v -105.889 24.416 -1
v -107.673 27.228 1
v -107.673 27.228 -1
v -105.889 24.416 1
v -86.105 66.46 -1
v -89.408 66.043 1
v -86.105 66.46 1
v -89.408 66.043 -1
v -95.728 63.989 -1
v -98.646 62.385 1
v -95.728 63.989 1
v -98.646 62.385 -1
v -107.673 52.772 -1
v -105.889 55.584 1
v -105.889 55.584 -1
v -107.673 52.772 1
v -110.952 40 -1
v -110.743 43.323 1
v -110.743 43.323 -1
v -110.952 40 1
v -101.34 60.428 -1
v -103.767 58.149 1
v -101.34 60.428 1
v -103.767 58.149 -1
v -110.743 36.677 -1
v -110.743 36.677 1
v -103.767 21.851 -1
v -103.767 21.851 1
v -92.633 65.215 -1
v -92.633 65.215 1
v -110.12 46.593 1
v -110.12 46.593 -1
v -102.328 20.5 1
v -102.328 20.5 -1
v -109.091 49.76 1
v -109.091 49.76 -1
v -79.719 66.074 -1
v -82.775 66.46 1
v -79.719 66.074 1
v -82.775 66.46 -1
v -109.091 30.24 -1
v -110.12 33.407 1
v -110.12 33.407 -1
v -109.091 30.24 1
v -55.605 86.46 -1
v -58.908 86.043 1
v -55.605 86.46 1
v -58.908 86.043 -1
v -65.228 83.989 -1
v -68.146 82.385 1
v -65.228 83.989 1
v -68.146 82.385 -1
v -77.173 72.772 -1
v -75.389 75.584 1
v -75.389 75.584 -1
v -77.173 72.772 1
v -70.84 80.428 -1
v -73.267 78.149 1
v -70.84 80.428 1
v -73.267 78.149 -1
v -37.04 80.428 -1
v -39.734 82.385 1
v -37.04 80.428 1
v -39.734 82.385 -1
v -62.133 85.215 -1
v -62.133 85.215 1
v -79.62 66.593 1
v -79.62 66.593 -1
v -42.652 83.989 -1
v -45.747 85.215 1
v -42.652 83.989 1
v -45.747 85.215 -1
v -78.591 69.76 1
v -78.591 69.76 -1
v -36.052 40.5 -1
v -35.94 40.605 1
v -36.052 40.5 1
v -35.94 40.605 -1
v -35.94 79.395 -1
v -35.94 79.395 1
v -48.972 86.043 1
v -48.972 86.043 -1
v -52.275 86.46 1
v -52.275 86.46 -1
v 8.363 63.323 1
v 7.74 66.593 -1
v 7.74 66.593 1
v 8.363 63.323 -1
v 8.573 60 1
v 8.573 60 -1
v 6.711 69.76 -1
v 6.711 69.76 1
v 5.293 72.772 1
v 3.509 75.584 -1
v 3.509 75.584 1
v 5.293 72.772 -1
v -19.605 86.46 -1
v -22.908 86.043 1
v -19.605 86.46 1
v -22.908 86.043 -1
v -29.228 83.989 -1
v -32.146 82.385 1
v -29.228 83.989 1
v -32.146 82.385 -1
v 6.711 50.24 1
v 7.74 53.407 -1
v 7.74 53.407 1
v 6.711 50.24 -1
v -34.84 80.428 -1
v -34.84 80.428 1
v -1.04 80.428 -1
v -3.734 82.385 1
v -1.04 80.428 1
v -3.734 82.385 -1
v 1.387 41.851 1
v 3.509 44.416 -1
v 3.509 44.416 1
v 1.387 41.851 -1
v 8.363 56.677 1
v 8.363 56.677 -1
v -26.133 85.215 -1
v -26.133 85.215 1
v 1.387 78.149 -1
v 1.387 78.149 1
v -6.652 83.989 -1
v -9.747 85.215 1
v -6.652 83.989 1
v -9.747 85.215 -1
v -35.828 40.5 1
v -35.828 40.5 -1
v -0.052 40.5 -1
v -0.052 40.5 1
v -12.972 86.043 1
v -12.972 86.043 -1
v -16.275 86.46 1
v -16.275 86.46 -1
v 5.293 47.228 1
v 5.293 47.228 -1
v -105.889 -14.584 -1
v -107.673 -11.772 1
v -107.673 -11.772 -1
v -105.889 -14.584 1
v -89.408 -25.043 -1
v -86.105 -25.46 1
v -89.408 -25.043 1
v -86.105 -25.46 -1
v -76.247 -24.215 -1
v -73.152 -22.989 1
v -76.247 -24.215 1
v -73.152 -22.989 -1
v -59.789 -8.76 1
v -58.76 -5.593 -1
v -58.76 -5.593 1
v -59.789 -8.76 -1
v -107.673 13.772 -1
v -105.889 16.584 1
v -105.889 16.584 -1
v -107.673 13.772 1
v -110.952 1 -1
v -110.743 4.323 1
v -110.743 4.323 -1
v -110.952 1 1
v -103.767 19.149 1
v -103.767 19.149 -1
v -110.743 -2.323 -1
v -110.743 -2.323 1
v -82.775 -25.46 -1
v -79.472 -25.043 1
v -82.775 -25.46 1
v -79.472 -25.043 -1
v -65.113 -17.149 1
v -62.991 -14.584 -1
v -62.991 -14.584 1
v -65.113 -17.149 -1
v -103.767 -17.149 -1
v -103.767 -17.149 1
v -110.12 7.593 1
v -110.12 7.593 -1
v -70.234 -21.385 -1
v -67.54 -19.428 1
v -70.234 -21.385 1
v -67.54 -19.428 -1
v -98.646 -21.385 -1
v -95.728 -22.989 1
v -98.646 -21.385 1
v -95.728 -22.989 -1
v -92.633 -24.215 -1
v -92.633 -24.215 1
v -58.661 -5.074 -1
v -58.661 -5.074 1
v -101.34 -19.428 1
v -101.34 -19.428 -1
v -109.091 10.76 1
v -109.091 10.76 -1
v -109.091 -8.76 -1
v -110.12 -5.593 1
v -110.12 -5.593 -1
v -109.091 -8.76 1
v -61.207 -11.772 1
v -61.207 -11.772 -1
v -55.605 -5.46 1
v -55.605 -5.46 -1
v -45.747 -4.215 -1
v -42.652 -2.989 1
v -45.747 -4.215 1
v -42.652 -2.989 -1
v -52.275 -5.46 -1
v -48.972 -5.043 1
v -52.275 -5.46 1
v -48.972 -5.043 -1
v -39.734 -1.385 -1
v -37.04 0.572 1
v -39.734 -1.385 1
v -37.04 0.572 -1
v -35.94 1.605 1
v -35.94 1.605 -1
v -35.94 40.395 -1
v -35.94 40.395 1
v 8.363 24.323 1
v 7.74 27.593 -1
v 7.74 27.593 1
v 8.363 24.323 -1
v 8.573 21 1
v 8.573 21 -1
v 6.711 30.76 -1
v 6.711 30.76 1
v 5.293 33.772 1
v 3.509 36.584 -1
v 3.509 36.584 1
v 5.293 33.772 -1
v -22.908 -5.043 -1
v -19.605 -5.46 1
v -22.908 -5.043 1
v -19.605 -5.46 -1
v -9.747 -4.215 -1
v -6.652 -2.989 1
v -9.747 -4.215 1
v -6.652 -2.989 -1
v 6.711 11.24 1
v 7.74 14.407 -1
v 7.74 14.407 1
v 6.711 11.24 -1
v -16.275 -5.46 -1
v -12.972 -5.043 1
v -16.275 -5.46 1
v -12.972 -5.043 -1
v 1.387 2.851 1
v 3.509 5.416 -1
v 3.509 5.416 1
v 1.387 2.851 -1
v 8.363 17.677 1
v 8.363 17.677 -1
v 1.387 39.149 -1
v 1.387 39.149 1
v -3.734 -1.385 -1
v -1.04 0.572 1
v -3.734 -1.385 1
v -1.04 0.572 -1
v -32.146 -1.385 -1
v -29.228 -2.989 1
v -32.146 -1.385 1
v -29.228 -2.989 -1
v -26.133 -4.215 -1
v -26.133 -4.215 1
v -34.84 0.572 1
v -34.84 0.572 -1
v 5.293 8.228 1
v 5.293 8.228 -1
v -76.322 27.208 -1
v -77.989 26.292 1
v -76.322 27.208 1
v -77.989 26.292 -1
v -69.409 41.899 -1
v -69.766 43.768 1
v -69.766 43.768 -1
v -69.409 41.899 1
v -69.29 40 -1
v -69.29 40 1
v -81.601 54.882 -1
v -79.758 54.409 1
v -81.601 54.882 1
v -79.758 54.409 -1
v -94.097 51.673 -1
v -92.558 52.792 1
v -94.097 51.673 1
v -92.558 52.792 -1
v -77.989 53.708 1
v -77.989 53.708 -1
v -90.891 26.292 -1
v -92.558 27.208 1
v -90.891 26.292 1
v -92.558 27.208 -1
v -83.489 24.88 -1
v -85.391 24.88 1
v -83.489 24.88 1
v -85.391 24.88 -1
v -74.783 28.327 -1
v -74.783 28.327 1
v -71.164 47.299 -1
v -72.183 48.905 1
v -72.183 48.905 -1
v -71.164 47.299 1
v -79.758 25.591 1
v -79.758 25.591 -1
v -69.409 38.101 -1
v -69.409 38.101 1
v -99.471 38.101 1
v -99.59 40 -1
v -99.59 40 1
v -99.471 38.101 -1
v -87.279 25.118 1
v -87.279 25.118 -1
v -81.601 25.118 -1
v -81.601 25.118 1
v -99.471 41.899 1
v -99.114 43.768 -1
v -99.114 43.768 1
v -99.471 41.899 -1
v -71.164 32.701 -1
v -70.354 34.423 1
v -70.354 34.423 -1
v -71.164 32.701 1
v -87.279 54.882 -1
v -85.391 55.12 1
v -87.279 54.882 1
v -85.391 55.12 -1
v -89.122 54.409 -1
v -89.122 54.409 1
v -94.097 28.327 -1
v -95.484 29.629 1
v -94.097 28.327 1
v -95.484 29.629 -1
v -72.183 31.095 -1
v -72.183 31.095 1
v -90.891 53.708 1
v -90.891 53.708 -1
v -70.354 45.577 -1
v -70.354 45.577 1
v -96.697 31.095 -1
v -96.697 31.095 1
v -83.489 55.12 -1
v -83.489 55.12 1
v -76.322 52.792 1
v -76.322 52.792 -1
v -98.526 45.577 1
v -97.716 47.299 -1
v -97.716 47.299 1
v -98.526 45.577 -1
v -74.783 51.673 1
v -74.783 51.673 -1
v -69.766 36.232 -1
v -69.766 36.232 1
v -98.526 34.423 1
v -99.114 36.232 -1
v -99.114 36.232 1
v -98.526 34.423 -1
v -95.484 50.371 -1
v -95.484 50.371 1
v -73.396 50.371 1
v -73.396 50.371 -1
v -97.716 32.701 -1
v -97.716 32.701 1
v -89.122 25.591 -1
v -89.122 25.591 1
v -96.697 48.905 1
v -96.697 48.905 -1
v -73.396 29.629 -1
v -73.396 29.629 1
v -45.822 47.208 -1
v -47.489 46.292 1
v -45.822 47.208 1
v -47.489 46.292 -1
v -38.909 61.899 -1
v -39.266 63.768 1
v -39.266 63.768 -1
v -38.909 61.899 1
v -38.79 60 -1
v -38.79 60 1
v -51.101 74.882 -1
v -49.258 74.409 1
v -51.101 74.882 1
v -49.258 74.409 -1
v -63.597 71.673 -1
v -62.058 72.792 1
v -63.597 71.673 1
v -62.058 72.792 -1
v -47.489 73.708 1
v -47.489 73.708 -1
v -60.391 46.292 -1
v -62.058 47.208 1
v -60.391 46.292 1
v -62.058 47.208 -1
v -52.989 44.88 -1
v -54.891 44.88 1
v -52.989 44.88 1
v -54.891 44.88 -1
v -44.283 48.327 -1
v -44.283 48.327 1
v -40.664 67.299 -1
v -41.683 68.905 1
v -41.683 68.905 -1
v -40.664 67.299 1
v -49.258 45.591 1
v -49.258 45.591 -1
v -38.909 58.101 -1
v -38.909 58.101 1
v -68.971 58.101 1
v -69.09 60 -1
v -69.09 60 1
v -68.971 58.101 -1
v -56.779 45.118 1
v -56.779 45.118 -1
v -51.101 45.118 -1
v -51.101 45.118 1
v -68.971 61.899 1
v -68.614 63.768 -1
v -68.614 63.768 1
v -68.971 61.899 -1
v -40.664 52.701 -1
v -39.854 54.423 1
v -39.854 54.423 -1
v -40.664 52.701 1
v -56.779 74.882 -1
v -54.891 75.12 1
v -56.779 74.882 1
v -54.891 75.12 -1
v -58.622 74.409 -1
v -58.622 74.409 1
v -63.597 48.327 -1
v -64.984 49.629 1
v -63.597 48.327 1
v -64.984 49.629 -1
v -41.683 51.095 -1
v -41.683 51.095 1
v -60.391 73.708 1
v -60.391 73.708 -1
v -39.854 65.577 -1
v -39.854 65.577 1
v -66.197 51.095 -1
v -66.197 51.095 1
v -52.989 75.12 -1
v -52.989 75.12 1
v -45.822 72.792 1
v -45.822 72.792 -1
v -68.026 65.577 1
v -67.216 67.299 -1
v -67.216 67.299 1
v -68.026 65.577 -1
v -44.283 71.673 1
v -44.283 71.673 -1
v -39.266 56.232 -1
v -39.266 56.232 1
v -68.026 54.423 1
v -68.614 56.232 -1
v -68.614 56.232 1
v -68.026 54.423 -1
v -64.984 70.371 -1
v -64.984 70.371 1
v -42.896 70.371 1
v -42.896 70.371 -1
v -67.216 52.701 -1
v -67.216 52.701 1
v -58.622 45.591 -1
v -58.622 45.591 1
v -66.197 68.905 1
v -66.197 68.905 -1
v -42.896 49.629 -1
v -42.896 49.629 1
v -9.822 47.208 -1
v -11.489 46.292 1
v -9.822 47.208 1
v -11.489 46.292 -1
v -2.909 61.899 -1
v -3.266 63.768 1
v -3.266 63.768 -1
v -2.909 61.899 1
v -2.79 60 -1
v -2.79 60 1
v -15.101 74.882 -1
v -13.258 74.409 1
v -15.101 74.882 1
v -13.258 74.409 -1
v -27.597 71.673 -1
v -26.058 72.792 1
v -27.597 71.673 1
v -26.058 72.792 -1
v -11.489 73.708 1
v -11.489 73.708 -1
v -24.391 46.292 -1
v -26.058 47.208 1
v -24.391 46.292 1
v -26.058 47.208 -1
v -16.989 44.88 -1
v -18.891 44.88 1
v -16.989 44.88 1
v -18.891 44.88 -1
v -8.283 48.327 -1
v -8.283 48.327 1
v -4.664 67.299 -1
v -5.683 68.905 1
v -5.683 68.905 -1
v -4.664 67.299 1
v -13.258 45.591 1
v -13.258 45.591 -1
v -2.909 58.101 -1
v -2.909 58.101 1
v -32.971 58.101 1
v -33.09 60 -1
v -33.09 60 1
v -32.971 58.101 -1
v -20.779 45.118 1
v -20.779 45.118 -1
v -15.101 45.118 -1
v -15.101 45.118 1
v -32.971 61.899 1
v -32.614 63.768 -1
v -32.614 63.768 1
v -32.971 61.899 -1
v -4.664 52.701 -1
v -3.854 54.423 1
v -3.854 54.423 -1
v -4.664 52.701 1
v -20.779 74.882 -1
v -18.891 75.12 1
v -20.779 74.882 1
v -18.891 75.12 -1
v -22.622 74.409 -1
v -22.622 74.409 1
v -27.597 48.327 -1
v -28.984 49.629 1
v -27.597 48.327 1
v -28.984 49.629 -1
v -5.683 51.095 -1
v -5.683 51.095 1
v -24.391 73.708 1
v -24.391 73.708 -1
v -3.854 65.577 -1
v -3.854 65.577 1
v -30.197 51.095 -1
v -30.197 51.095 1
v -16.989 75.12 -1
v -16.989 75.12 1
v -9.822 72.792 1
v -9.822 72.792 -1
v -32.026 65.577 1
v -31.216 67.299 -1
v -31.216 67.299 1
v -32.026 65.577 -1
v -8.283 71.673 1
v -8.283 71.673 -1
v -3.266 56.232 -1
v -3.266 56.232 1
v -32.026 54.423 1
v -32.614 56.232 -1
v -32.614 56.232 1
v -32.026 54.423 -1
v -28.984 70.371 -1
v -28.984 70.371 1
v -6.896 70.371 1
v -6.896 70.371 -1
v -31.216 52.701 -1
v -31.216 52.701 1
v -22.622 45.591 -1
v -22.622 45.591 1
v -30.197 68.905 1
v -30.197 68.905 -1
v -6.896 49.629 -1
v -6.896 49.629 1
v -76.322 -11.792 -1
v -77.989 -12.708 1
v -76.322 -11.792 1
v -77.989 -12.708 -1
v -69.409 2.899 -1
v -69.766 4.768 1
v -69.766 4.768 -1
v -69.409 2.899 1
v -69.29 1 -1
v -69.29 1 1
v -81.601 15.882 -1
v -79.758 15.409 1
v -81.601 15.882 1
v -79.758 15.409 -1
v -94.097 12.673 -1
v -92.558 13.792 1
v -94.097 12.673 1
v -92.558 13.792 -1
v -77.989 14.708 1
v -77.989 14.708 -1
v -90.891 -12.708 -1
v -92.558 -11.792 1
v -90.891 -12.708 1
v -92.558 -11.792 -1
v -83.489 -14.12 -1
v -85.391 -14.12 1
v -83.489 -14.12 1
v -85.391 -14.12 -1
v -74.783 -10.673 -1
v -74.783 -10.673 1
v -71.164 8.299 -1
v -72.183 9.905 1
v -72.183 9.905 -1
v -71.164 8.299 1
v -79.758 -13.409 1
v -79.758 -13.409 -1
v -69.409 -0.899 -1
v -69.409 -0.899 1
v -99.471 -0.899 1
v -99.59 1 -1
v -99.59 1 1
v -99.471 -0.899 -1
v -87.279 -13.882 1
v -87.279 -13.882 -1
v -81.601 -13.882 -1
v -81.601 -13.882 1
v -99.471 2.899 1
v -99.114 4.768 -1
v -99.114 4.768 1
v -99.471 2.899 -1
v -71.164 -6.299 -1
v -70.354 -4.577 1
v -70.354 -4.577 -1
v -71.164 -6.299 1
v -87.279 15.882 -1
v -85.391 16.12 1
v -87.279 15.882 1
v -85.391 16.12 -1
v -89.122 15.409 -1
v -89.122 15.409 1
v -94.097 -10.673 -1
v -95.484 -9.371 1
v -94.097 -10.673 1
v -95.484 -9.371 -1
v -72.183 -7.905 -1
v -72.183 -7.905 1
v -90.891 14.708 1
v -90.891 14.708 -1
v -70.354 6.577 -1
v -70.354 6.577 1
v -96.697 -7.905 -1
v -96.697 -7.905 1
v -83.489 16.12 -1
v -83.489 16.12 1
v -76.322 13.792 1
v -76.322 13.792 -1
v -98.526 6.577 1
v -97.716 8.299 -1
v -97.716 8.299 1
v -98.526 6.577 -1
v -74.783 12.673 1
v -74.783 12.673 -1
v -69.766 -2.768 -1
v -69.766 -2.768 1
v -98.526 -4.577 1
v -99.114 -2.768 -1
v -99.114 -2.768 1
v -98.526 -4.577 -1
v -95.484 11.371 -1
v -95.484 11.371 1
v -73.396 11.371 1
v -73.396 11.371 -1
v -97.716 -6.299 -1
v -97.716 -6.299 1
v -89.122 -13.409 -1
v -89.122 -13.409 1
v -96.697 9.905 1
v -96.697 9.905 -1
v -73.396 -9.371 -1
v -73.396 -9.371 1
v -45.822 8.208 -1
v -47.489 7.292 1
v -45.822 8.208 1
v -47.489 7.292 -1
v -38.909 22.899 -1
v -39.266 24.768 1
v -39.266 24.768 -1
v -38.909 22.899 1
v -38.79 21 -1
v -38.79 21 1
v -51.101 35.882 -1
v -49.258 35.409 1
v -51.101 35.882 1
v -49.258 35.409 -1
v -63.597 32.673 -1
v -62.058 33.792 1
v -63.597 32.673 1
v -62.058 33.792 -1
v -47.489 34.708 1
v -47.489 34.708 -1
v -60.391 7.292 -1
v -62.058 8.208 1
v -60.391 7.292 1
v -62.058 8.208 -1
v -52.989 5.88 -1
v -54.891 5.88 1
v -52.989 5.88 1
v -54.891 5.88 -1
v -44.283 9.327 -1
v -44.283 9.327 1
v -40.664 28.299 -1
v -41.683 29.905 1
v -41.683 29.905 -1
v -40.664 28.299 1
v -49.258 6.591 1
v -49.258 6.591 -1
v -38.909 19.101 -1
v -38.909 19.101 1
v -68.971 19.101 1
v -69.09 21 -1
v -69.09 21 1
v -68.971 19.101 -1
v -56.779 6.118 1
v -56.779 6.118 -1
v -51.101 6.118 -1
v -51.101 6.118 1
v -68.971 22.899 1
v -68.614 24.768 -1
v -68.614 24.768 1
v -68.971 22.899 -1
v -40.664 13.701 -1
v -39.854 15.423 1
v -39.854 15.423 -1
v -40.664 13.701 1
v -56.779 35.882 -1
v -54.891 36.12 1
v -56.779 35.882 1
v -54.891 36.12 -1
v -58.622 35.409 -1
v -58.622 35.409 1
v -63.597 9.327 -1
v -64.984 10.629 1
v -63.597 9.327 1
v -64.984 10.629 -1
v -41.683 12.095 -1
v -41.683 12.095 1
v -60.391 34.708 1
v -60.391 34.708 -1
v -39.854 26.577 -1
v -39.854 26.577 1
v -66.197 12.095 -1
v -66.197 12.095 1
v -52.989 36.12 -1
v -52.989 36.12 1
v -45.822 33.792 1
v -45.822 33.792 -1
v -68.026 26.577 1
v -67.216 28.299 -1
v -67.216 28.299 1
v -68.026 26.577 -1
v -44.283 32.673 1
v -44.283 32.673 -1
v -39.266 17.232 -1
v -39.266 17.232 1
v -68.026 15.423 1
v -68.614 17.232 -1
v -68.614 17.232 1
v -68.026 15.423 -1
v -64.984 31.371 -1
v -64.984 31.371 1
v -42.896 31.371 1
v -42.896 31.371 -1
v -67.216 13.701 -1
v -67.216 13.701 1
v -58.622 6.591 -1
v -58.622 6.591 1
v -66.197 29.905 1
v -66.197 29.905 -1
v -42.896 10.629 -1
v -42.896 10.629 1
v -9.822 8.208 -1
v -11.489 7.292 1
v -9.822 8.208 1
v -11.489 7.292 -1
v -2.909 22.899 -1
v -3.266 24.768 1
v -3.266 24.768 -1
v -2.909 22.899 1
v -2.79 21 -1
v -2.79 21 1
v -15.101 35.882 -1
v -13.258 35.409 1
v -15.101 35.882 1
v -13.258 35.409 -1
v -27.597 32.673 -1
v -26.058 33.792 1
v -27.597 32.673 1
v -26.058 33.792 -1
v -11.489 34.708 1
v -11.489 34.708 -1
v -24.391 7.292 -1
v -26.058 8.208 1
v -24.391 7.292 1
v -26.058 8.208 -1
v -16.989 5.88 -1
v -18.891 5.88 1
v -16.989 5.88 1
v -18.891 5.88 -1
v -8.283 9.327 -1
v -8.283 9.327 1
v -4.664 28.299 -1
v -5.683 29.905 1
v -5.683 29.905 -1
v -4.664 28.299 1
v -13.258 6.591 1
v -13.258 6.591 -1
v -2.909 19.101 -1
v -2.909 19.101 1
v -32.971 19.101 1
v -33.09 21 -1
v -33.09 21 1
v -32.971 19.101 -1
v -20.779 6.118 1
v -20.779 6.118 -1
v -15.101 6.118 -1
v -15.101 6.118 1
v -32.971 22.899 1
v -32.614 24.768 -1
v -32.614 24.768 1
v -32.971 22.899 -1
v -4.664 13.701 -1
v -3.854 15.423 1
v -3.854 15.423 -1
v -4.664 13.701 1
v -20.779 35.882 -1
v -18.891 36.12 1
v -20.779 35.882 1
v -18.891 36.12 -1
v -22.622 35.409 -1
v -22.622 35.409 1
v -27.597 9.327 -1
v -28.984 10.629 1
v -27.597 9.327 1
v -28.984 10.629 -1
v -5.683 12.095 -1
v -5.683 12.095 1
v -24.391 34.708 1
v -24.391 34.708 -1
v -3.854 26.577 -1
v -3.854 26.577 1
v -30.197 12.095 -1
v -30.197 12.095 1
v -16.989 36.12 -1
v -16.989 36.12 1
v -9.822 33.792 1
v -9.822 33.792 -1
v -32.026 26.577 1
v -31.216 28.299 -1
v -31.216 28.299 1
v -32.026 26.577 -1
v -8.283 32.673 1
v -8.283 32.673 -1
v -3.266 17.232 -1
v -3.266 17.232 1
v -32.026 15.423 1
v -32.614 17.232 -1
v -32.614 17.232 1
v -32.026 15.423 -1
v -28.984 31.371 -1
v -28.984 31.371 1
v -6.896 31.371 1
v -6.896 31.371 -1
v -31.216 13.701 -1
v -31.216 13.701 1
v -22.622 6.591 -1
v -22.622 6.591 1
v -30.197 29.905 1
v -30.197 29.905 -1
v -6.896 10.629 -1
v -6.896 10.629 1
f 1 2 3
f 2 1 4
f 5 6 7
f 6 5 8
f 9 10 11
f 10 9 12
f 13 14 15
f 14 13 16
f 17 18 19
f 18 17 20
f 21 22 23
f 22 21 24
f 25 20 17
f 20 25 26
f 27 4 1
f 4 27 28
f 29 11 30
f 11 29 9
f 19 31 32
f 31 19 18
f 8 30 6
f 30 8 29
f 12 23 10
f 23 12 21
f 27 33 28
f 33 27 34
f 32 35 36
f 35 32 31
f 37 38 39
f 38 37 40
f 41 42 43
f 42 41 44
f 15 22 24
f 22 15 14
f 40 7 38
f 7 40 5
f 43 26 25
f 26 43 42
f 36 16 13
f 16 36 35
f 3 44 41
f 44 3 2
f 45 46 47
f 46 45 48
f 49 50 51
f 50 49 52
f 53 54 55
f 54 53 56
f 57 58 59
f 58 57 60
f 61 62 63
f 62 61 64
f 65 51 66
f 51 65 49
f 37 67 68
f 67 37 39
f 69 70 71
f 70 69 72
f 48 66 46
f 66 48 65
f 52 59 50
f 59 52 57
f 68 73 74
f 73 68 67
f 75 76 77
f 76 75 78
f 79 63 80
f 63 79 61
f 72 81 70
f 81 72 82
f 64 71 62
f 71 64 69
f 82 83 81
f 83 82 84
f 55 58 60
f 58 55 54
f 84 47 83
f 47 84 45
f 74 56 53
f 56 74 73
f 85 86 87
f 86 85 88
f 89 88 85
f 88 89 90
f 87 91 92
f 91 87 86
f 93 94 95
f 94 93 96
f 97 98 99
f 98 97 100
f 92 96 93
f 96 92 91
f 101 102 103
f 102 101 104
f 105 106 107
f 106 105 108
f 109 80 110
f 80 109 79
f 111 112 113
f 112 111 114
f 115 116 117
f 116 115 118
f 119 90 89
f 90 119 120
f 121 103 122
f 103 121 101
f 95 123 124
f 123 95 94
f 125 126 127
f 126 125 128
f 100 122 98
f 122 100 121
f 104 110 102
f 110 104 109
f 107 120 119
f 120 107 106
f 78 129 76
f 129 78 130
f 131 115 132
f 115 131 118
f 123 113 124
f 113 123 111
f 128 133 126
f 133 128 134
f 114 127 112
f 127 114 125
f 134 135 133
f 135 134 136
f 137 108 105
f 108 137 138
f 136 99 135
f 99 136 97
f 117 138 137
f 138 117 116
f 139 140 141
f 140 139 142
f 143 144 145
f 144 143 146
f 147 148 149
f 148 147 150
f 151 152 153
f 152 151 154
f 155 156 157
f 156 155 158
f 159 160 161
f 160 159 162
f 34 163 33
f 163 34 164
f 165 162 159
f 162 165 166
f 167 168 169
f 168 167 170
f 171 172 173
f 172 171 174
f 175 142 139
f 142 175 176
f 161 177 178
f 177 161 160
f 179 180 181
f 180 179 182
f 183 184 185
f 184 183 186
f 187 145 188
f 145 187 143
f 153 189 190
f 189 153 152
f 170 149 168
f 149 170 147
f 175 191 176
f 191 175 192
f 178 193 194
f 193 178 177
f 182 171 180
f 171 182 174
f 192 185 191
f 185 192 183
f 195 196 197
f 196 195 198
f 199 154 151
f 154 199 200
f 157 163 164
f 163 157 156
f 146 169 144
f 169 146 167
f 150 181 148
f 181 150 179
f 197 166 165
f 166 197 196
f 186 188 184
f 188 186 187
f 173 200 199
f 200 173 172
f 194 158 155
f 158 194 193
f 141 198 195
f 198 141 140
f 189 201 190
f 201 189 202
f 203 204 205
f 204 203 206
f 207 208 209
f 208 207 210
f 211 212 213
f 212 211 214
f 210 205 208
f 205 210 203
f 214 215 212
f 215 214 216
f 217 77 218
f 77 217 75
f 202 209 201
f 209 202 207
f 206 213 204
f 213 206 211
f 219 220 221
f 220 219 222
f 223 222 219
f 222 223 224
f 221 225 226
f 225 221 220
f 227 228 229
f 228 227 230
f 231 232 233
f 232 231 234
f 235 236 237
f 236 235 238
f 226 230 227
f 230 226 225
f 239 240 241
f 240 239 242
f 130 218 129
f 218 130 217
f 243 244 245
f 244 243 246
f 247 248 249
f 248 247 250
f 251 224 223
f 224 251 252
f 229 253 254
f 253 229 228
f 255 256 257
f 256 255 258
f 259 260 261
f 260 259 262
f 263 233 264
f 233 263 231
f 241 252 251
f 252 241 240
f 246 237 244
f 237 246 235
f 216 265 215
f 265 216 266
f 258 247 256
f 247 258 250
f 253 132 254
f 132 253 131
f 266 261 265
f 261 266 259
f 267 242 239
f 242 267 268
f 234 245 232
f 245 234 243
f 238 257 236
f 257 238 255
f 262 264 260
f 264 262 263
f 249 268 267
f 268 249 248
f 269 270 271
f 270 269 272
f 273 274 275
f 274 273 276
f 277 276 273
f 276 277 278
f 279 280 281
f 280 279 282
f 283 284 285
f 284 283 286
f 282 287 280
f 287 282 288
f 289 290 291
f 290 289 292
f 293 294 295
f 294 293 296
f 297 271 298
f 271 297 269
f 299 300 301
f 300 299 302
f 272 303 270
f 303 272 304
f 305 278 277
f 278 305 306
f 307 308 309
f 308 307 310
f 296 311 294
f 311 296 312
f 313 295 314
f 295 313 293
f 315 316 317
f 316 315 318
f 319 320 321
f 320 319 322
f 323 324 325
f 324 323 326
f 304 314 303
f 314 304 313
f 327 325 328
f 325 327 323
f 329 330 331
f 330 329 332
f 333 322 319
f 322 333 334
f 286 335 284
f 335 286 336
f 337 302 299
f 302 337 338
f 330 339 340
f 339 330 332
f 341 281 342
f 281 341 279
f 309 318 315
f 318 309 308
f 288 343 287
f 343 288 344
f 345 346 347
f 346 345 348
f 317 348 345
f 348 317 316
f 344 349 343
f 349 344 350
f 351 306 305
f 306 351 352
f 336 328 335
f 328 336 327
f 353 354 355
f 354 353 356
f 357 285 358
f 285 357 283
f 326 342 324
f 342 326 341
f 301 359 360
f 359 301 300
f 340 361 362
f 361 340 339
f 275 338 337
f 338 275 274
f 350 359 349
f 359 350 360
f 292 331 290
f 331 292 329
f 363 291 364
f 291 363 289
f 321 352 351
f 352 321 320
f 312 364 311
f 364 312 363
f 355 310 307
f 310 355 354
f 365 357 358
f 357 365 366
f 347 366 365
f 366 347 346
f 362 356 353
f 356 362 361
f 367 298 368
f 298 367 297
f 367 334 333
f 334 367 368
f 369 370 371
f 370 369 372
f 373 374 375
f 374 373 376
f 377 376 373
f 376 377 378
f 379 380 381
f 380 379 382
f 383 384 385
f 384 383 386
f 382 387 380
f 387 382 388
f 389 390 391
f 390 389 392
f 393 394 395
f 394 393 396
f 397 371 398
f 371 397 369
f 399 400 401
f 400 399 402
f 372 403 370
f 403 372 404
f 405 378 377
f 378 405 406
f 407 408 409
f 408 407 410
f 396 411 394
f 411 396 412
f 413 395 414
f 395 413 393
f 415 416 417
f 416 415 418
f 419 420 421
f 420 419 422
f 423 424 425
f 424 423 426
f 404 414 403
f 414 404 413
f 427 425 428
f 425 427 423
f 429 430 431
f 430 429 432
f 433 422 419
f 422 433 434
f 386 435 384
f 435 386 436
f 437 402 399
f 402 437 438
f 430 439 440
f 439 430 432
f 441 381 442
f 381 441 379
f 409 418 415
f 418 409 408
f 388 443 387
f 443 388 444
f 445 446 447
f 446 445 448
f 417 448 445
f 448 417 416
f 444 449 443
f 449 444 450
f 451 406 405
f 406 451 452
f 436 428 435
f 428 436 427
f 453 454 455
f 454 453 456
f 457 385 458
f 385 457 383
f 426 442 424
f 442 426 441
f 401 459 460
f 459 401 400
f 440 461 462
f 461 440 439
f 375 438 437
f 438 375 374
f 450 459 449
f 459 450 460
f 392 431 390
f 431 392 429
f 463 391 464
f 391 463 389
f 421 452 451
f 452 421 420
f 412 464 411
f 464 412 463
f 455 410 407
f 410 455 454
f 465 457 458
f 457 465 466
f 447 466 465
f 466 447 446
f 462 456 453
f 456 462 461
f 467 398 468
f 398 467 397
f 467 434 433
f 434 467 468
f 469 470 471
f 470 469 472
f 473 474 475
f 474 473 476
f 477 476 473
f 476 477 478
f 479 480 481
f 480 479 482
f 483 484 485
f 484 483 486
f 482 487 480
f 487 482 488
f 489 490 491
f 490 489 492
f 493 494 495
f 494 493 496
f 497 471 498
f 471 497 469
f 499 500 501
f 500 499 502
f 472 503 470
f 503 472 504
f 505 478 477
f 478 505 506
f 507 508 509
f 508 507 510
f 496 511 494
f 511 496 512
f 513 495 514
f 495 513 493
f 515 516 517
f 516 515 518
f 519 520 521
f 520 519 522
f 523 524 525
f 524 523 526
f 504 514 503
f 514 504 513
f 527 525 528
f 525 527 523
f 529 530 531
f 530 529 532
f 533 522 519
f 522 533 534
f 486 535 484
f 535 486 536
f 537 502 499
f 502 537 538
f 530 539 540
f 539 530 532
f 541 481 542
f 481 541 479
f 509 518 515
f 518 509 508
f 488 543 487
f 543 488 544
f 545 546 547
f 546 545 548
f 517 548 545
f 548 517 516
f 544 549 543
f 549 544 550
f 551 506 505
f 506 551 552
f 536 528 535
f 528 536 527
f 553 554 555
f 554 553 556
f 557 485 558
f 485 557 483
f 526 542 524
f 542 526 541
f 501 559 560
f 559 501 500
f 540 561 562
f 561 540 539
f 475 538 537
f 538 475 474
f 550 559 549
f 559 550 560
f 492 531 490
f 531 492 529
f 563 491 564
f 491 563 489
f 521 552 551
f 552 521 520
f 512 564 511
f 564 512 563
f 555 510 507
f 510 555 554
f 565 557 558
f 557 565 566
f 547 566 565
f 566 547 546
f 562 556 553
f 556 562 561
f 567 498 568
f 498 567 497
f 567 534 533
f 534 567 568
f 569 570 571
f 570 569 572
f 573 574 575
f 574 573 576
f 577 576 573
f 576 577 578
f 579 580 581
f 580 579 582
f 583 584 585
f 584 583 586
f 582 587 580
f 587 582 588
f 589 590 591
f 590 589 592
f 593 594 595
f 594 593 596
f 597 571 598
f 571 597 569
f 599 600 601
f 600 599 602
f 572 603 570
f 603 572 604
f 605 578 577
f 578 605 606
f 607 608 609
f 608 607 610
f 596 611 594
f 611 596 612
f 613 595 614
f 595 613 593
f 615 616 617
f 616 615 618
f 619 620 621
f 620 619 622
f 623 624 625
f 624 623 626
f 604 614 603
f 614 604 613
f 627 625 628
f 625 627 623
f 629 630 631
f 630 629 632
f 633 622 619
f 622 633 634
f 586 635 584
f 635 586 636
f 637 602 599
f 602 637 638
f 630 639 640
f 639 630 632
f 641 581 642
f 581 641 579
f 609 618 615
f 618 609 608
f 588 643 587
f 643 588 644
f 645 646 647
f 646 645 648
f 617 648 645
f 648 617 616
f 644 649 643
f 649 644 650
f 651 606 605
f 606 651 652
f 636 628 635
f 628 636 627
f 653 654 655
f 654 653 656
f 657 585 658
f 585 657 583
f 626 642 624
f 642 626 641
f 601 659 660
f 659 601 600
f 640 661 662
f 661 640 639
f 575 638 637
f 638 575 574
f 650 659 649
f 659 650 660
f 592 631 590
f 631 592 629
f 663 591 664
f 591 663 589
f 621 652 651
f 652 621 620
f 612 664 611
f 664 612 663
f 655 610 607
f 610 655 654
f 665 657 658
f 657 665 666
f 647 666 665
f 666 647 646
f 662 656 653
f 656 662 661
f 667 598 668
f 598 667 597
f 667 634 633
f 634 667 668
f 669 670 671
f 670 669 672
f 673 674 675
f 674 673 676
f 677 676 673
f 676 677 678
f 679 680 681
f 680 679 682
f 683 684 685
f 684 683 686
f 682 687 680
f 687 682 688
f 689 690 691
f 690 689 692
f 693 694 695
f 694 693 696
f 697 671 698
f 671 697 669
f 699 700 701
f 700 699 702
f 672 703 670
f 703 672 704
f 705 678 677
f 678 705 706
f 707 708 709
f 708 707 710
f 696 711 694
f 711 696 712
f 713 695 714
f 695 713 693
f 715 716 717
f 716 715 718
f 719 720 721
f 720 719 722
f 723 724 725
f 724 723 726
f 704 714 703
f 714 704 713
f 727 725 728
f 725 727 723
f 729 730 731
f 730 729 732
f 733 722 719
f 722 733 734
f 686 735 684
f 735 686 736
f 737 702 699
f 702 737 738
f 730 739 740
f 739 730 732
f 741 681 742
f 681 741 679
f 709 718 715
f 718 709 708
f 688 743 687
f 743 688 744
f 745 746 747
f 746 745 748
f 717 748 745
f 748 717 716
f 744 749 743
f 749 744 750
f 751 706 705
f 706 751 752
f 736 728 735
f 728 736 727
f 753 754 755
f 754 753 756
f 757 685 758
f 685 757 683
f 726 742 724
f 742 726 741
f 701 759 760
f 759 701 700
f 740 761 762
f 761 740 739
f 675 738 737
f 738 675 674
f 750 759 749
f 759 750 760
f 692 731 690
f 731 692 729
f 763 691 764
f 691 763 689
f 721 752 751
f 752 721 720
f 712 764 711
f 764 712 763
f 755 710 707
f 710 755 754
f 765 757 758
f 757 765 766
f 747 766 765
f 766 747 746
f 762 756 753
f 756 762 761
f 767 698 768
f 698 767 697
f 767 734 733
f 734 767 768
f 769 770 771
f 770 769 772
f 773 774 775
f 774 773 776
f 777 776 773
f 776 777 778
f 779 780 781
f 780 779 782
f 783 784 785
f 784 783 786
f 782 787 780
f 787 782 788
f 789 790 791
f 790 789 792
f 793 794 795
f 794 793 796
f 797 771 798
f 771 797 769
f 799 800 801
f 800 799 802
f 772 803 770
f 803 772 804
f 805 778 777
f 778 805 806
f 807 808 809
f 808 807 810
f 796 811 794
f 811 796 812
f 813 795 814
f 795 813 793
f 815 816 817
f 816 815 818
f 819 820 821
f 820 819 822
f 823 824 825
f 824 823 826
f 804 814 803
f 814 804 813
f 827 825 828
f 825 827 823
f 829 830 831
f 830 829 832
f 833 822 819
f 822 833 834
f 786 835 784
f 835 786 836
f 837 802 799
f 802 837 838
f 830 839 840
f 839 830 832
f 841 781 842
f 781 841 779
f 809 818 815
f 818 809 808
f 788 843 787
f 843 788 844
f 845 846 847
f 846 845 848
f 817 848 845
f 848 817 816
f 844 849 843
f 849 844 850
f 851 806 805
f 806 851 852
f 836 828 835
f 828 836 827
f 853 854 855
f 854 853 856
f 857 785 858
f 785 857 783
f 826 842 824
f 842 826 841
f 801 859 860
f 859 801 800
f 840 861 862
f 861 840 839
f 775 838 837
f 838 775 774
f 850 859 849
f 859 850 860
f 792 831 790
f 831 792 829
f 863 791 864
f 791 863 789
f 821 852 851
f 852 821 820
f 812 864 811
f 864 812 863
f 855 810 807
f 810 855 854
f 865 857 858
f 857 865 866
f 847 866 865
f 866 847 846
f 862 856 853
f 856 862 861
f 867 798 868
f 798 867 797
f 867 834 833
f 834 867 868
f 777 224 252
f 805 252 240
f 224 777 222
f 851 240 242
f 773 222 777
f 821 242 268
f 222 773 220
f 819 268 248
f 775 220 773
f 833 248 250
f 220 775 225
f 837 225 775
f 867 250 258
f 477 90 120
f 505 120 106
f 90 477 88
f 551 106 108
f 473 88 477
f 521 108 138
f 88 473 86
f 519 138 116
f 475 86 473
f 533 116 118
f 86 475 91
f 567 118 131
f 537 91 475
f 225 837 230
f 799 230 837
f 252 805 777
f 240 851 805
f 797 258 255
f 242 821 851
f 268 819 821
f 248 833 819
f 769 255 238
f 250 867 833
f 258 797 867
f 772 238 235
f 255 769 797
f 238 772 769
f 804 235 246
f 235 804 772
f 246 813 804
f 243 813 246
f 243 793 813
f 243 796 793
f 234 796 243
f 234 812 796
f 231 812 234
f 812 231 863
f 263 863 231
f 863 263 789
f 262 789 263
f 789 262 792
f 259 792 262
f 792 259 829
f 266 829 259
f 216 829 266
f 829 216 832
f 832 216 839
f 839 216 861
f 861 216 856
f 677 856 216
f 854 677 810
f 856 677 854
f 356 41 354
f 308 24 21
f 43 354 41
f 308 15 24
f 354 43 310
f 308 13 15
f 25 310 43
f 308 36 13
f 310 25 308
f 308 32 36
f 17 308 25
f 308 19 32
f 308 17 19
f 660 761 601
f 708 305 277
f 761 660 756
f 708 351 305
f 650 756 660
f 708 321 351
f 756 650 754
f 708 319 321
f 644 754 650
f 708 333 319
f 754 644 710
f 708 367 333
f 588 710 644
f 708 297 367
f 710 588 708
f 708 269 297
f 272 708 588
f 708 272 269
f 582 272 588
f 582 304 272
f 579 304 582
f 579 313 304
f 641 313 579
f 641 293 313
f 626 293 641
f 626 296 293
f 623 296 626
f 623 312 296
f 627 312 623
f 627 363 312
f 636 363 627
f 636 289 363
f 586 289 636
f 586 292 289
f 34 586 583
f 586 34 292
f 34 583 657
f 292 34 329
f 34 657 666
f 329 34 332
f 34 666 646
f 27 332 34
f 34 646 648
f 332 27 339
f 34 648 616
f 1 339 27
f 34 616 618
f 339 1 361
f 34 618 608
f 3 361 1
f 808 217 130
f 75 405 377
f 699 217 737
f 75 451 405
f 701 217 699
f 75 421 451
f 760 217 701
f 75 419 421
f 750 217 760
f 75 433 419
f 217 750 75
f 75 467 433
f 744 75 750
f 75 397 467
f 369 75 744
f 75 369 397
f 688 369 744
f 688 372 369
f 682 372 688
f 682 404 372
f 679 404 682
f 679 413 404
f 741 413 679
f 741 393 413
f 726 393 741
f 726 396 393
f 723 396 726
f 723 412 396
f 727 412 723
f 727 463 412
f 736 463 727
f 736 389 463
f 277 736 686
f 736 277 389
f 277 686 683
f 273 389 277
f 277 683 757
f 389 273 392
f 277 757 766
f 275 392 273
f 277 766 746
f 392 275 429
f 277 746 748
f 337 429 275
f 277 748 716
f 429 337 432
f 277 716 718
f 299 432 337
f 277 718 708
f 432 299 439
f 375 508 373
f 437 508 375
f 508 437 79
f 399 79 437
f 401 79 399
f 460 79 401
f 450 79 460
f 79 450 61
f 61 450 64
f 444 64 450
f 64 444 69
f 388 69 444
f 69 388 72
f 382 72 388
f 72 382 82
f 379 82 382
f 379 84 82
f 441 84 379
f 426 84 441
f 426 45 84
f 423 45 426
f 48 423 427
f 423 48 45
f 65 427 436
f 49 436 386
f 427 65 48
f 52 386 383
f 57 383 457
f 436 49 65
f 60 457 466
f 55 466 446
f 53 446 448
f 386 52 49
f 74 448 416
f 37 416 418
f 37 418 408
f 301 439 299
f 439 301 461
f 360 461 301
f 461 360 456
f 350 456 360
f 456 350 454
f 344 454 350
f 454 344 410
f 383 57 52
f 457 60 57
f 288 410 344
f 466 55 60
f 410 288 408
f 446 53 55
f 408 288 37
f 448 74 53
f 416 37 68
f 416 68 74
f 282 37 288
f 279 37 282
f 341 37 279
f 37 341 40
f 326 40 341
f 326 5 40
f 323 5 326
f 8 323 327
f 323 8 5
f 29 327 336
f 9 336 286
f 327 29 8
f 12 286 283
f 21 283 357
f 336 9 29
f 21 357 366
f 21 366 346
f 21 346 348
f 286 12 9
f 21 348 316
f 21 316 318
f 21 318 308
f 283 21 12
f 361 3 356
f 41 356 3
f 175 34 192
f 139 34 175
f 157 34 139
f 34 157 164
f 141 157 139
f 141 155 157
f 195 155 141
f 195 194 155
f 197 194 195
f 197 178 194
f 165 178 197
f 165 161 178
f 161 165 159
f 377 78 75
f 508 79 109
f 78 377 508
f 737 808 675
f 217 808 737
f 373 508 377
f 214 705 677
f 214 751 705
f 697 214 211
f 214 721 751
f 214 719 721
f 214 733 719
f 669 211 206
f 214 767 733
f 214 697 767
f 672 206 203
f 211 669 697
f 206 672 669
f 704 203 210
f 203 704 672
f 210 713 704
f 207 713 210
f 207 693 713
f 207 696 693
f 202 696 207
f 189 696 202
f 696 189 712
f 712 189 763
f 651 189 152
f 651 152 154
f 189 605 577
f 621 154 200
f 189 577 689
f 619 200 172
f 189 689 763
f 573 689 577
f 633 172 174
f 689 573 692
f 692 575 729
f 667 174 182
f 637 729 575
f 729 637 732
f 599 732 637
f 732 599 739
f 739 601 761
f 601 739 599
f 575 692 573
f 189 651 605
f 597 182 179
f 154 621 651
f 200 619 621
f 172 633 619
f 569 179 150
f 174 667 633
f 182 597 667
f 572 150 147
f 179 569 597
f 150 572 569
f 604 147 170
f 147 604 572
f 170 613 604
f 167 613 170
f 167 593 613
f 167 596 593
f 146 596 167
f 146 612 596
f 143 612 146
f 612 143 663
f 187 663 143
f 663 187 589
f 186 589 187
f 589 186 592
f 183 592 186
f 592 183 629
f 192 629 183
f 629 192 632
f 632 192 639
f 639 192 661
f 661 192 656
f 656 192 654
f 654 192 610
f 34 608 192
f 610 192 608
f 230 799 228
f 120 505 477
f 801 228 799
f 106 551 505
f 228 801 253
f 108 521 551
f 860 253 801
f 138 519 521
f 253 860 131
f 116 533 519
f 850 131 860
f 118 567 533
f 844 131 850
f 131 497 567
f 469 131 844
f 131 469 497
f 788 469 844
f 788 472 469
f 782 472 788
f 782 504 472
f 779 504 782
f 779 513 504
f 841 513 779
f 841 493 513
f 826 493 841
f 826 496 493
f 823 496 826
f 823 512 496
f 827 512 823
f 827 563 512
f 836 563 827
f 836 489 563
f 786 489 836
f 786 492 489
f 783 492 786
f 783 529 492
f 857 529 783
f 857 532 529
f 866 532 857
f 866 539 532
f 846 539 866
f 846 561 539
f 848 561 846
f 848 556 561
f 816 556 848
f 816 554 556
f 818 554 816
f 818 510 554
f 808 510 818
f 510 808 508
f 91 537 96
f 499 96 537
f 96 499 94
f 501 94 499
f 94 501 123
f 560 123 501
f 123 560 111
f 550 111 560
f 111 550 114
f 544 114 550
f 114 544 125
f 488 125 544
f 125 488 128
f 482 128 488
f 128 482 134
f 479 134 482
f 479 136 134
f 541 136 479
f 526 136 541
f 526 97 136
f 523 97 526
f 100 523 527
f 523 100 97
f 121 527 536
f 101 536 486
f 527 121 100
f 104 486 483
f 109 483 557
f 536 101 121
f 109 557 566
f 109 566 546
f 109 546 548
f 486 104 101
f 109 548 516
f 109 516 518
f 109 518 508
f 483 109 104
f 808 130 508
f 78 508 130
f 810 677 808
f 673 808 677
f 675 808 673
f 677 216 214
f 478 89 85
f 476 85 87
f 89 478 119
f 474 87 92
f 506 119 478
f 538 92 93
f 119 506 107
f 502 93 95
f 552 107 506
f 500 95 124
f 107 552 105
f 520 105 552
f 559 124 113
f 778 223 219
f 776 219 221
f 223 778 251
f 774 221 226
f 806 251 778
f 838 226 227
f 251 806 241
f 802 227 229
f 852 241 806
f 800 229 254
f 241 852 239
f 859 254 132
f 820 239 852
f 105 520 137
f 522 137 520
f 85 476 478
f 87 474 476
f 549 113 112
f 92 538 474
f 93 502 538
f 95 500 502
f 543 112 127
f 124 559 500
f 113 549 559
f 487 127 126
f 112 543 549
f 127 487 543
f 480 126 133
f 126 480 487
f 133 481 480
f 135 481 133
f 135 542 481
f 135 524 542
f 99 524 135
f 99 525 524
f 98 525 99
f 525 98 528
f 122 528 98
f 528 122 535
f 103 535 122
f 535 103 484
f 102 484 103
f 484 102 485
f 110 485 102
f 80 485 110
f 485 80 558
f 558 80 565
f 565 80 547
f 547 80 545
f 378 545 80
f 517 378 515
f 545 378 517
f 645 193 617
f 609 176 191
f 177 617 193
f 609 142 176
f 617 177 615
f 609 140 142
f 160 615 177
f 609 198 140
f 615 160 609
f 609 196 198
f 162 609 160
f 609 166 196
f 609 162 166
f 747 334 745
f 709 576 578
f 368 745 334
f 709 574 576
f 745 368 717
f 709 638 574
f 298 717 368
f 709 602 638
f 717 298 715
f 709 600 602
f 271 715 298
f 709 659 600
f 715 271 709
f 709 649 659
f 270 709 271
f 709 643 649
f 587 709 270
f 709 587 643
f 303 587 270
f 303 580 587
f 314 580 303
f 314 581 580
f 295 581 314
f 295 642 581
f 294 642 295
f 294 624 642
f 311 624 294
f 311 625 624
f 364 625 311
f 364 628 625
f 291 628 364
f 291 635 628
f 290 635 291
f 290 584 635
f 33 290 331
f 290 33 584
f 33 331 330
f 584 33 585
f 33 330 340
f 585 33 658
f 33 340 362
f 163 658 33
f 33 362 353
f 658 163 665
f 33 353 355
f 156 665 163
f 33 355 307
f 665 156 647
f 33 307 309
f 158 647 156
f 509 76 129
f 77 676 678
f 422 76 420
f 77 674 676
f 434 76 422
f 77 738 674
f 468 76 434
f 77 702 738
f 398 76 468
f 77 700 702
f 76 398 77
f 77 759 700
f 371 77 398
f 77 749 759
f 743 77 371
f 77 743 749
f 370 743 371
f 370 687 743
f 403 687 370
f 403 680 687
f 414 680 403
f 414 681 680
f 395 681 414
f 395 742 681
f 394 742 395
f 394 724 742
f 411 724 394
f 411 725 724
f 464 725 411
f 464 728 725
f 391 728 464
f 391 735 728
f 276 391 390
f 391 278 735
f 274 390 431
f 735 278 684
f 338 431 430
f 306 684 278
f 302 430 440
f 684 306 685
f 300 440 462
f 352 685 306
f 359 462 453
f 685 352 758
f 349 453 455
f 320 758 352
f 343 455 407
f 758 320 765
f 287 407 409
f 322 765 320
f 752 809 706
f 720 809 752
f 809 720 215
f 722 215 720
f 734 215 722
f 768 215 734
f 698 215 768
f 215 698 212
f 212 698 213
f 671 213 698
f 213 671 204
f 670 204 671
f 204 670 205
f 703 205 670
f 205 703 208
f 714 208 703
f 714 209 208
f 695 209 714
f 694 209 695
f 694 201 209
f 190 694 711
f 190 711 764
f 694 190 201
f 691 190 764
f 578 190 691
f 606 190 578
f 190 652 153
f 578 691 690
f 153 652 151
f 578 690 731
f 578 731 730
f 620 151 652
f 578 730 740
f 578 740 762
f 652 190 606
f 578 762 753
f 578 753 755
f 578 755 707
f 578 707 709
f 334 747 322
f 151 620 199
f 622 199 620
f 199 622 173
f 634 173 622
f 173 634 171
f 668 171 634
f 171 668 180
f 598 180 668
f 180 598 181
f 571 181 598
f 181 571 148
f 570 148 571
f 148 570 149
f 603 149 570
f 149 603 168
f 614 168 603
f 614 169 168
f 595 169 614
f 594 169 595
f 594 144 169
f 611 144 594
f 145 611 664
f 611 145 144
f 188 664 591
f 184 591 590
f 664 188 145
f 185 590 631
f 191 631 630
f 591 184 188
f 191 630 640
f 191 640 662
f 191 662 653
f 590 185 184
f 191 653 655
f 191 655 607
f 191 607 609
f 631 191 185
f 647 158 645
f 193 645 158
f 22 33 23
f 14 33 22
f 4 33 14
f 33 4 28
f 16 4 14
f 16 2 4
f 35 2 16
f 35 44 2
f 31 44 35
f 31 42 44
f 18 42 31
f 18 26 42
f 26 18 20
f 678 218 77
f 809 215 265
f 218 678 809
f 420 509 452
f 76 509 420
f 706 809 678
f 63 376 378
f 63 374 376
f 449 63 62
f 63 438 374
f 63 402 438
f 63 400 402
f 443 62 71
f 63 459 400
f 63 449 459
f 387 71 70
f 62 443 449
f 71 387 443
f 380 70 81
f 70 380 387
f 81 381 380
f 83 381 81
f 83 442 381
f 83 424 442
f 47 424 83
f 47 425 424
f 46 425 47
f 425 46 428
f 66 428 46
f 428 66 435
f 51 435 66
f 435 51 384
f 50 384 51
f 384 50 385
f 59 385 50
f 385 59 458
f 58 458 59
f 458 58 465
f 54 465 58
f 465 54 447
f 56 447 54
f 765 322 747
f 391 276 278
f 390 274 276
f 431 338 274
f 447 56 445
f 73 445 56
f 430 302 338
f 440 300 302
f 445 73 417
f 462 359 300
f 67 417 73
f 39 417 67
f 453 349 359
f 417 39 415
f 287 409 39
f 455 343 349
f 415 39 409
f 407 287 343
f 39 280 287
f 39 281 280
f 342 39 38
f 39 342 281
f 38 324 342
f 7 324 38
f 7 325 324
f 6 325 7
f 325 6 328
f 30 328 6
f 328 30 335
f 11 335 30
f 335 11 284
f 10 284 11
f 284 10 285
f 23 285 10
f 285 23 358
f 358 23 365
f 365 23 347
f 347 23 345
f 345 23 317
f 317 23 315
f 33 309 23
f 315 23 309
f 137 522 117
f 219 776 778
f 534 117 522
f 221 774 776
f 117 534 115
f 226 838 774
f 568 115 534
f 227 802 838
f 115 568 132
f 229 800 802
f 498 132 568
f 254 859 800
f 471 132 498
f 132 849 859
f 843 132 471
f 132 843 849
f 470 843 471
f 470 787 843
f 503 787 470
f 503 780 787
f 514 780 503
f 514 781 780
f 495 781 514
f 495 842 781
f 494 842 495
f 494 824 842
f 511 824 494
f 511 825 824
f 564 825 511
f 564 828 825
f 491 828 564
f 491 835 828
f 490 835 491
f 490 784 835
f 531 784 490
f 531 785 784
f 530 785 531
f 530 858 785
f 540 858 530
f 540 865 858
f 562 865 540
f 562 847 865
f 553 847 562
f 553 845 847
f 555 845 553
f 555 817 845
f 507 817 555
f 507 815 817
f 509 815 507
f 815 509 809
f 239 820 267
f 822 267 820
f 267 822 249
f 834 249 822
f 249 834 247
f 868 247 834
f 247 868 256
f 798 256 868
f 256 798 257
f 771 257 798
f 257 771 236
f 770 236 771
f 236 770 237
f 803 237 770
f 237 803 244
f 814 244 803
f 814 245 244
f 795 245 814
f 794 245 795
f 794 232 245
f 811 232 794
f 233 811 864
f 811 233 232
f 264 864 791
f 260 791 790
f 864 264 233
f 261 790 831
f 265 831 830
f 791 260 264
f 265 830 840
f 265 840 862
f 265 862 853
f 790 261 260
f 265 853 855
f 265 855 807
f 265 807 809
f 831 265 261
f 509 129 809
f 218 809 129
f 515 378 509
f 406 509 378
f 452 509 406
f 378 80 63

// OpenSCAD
// file: roundedcube.scad
// More information: https://danielupshaw.com/openscad-rounded-corners/

// Set to 0.01 for higher definition curves (renders slower)
$fs = 0.15;

module roundedcube(size = [1, 1, 1], center = false, radius = 0.5, apply_to = "all") {
	// If single value, convert to [x, y, z] vector
	size = (size[0] == undef) ? [size, size, size] : size;

	translate_min = radius;
	translate_xmax = size[0] - radius;
	translate_ymax = size[1] - radius;
	translate_zmax = size[2] - radius;

	diameter = radius * 2;

	obj_translate = (center == false) ?
		[0, 0, 0] : [
			-(size[0] / 2),
			-(size[1] / 2),
			-(size[2] / 2)
		];

	translate(v = obj_translate) {
		hull() {
			for (translate_x = [translate_min, translate_xmax]) {
				x_at = (translate_x == translate_min) ? "min" : "max";
				for (translate_y = [translate_min, translate_ymax]) {
					y_at = (translate_y == translate_min) ? "min" : "max";
					for (translate_z = [translate_min, translate_zmax]) {
						z_at = (translate_z == translate_min) ? "min" : "max";

						translate(v = [translate_x, translate_y, translate_z])
						if (
							(apply_to == "all") ||
							(apply_to == "xmin" && x_at == "min") || (apply_to == "xmax" && x_at == "max") ||
							(apply_to == "ymin" && y_at == "min") || (apply_to == "ymax" && y_at == "max") ||
							(apply_to == "zmin" && z_at == "min") || (apply_to == "zmax" && z_at == "max")
						) {
							sphere(r = radius);
						} else {
							rotate = 
								(apply_to == "xmin" || apply_to == "xmax" || apply_to == "x") ? [0, 90, 0] : (
								(apply_to == "ymin" || apply_to == "ymax" || apply_to == "y") ? [90, 90, 0] :
								[0, 0, 0]
							);
							rotate(a = rotate)
							cylinder(h = diameter, r = radius, center = true);
						}
					}
				}
			}
		}
	}
}
// file: parameters.scad
/* Copyright Brian Stephan 2023
 *
 * This file is part of the Buildable Stick System.
 *
 * The Buildable Stick System is free software: you can redistribute it and/or modify
 * it under the terms of the GNU General Public License as published by the
 * Free Software Foundation, either version 3 of the License, or (at your
 * option) any later version.
 *
 * The Buildable Stick System is distributed in the hope that it will be useful, but
 * WITHOUT ANY WARRANTY; without even the implied warranty of MERCHANTABILITY
 * or FITNESS FOR A PARTICULAR PURPOSE. See the GNU General Public License for
 * more details.
 *
 * You should have received a copy of the GNU General Public License along with
 * the Buildable Stick System. If not, see <https://www.gnu.org/licenses/>.
 */

// adjustments
hole_tolerance = 0.15;

// M2
m2_screw_selftap_radius = 0.95;

// M3
m3_screw_selftap_radius = 1.3;

// M4
m4_bolt_radius = 2 + hole_tolerance;
m4_bolt_countersink_radius = 6.1 + hole_tolerance;
m4_bolt_hex_exterior_radius = 3.6 + hole_tolerance;

// 24mm button
small_button_radius = 12 + hole_tolerance;

// 30mm button
big_button_radius = 15 + hole_tolerance;

// JLF mount dimensions
lever_mount_x = 53;
lever_mount_y = 95;
lever_mount_z = 2;

// standard lever hole
lever_plate_hole = 12;

// case dimensions
// base frame box. reminder: top of inside (including mounts) is chopped by top_plate_z for plates
frame_x = 233;
frame_y = 208;
frame_z = 50;

// depth of the "lip" of the frame that the top plate sets into/supports the overhang
frame_wall = 4;

// per neutrik (mm)
neutrik_panel_thickness = 3;

// top plate, which can either be the whole plate ("inset") or the mounting frame for a plate that overhangs
top_plate_x = frame_x - (frame_wall * 2);
top_plate_y = frame_y - (frame_wall * 2);
top_plate_z = 5;

// how much the top plate x/y is expanded to overhang the frame
// note that this is relative to the top plate (so the wall is added back)
top_plate_overhang_amount = 8.5;
overhang_top_plate_x = top_plate_x + (frame_wall * 2) + (top_plate_overhang_amount * 2);
overhang_top_plate_y = top_plate_y + (frame_wall * 2) + (top_plate_overhang_amount * 2);

plate_to_frame_point_x = (top_plate_x/2)-10;
plate_to_frame_point_y = (top_plate_y/2)-10;

// frame interior that supports the top plates
panel_support_width = 5;

// neutrik D screw holes
neutrik_d_screw_radius = 1.6 + hole_tolerance;
neutrik_d_radius = 12 + hole_tolerance;

// additional button radius for decorative panels, etc.
decorative_radius_scale = 1.75;
jumbo_decorative_radius_scale = 2;
// main file
/* Copyright Brian Stephan 2023
 *
 * This file is part of the Buildable Stick System.
 *
 * The Buildable Stick System is free software: you can redistribute it and/or modify
 * it under the terms of the GNU General Public License as published by the
 * Free Software Foundation, either version 3 of the License, or (at your
 * option) any later version.
 *
 * The Buildable Stick System is distributed in the hope that it will be useful, but
 * WITHOUT ANY WARRANTY; without even the implied warranty of MERCHANTABILITY
 * or FITNESS FOR A PARTICULAR PURPOSE. See the GNU General Public License for
 * more details.
 *
 * You should have received a copy of the GNU General Public License along with
 * the Buildable Stick System. If not, see <https://www.gnu.org/licenses/>.
 */

include <parameters.scad>
include <components.scad>

module sega_2p_6_button_decorative_plate() {
	difference() {
		// get a 2mm slice of the bigger button cylinders
		translate([0, 0, -55]) sega_2p_6_button();
		translate([0, 0, -100]) cube([500, 500, 198], center=true);
		translate([0, 0, 100]) cube([500, 500, 198], center=true);
		// cut out the normal holes
		translate([0, 0, -1]) sega_2p_6_button();
	}
}

sega_2p_6_button_decorative_plate();
